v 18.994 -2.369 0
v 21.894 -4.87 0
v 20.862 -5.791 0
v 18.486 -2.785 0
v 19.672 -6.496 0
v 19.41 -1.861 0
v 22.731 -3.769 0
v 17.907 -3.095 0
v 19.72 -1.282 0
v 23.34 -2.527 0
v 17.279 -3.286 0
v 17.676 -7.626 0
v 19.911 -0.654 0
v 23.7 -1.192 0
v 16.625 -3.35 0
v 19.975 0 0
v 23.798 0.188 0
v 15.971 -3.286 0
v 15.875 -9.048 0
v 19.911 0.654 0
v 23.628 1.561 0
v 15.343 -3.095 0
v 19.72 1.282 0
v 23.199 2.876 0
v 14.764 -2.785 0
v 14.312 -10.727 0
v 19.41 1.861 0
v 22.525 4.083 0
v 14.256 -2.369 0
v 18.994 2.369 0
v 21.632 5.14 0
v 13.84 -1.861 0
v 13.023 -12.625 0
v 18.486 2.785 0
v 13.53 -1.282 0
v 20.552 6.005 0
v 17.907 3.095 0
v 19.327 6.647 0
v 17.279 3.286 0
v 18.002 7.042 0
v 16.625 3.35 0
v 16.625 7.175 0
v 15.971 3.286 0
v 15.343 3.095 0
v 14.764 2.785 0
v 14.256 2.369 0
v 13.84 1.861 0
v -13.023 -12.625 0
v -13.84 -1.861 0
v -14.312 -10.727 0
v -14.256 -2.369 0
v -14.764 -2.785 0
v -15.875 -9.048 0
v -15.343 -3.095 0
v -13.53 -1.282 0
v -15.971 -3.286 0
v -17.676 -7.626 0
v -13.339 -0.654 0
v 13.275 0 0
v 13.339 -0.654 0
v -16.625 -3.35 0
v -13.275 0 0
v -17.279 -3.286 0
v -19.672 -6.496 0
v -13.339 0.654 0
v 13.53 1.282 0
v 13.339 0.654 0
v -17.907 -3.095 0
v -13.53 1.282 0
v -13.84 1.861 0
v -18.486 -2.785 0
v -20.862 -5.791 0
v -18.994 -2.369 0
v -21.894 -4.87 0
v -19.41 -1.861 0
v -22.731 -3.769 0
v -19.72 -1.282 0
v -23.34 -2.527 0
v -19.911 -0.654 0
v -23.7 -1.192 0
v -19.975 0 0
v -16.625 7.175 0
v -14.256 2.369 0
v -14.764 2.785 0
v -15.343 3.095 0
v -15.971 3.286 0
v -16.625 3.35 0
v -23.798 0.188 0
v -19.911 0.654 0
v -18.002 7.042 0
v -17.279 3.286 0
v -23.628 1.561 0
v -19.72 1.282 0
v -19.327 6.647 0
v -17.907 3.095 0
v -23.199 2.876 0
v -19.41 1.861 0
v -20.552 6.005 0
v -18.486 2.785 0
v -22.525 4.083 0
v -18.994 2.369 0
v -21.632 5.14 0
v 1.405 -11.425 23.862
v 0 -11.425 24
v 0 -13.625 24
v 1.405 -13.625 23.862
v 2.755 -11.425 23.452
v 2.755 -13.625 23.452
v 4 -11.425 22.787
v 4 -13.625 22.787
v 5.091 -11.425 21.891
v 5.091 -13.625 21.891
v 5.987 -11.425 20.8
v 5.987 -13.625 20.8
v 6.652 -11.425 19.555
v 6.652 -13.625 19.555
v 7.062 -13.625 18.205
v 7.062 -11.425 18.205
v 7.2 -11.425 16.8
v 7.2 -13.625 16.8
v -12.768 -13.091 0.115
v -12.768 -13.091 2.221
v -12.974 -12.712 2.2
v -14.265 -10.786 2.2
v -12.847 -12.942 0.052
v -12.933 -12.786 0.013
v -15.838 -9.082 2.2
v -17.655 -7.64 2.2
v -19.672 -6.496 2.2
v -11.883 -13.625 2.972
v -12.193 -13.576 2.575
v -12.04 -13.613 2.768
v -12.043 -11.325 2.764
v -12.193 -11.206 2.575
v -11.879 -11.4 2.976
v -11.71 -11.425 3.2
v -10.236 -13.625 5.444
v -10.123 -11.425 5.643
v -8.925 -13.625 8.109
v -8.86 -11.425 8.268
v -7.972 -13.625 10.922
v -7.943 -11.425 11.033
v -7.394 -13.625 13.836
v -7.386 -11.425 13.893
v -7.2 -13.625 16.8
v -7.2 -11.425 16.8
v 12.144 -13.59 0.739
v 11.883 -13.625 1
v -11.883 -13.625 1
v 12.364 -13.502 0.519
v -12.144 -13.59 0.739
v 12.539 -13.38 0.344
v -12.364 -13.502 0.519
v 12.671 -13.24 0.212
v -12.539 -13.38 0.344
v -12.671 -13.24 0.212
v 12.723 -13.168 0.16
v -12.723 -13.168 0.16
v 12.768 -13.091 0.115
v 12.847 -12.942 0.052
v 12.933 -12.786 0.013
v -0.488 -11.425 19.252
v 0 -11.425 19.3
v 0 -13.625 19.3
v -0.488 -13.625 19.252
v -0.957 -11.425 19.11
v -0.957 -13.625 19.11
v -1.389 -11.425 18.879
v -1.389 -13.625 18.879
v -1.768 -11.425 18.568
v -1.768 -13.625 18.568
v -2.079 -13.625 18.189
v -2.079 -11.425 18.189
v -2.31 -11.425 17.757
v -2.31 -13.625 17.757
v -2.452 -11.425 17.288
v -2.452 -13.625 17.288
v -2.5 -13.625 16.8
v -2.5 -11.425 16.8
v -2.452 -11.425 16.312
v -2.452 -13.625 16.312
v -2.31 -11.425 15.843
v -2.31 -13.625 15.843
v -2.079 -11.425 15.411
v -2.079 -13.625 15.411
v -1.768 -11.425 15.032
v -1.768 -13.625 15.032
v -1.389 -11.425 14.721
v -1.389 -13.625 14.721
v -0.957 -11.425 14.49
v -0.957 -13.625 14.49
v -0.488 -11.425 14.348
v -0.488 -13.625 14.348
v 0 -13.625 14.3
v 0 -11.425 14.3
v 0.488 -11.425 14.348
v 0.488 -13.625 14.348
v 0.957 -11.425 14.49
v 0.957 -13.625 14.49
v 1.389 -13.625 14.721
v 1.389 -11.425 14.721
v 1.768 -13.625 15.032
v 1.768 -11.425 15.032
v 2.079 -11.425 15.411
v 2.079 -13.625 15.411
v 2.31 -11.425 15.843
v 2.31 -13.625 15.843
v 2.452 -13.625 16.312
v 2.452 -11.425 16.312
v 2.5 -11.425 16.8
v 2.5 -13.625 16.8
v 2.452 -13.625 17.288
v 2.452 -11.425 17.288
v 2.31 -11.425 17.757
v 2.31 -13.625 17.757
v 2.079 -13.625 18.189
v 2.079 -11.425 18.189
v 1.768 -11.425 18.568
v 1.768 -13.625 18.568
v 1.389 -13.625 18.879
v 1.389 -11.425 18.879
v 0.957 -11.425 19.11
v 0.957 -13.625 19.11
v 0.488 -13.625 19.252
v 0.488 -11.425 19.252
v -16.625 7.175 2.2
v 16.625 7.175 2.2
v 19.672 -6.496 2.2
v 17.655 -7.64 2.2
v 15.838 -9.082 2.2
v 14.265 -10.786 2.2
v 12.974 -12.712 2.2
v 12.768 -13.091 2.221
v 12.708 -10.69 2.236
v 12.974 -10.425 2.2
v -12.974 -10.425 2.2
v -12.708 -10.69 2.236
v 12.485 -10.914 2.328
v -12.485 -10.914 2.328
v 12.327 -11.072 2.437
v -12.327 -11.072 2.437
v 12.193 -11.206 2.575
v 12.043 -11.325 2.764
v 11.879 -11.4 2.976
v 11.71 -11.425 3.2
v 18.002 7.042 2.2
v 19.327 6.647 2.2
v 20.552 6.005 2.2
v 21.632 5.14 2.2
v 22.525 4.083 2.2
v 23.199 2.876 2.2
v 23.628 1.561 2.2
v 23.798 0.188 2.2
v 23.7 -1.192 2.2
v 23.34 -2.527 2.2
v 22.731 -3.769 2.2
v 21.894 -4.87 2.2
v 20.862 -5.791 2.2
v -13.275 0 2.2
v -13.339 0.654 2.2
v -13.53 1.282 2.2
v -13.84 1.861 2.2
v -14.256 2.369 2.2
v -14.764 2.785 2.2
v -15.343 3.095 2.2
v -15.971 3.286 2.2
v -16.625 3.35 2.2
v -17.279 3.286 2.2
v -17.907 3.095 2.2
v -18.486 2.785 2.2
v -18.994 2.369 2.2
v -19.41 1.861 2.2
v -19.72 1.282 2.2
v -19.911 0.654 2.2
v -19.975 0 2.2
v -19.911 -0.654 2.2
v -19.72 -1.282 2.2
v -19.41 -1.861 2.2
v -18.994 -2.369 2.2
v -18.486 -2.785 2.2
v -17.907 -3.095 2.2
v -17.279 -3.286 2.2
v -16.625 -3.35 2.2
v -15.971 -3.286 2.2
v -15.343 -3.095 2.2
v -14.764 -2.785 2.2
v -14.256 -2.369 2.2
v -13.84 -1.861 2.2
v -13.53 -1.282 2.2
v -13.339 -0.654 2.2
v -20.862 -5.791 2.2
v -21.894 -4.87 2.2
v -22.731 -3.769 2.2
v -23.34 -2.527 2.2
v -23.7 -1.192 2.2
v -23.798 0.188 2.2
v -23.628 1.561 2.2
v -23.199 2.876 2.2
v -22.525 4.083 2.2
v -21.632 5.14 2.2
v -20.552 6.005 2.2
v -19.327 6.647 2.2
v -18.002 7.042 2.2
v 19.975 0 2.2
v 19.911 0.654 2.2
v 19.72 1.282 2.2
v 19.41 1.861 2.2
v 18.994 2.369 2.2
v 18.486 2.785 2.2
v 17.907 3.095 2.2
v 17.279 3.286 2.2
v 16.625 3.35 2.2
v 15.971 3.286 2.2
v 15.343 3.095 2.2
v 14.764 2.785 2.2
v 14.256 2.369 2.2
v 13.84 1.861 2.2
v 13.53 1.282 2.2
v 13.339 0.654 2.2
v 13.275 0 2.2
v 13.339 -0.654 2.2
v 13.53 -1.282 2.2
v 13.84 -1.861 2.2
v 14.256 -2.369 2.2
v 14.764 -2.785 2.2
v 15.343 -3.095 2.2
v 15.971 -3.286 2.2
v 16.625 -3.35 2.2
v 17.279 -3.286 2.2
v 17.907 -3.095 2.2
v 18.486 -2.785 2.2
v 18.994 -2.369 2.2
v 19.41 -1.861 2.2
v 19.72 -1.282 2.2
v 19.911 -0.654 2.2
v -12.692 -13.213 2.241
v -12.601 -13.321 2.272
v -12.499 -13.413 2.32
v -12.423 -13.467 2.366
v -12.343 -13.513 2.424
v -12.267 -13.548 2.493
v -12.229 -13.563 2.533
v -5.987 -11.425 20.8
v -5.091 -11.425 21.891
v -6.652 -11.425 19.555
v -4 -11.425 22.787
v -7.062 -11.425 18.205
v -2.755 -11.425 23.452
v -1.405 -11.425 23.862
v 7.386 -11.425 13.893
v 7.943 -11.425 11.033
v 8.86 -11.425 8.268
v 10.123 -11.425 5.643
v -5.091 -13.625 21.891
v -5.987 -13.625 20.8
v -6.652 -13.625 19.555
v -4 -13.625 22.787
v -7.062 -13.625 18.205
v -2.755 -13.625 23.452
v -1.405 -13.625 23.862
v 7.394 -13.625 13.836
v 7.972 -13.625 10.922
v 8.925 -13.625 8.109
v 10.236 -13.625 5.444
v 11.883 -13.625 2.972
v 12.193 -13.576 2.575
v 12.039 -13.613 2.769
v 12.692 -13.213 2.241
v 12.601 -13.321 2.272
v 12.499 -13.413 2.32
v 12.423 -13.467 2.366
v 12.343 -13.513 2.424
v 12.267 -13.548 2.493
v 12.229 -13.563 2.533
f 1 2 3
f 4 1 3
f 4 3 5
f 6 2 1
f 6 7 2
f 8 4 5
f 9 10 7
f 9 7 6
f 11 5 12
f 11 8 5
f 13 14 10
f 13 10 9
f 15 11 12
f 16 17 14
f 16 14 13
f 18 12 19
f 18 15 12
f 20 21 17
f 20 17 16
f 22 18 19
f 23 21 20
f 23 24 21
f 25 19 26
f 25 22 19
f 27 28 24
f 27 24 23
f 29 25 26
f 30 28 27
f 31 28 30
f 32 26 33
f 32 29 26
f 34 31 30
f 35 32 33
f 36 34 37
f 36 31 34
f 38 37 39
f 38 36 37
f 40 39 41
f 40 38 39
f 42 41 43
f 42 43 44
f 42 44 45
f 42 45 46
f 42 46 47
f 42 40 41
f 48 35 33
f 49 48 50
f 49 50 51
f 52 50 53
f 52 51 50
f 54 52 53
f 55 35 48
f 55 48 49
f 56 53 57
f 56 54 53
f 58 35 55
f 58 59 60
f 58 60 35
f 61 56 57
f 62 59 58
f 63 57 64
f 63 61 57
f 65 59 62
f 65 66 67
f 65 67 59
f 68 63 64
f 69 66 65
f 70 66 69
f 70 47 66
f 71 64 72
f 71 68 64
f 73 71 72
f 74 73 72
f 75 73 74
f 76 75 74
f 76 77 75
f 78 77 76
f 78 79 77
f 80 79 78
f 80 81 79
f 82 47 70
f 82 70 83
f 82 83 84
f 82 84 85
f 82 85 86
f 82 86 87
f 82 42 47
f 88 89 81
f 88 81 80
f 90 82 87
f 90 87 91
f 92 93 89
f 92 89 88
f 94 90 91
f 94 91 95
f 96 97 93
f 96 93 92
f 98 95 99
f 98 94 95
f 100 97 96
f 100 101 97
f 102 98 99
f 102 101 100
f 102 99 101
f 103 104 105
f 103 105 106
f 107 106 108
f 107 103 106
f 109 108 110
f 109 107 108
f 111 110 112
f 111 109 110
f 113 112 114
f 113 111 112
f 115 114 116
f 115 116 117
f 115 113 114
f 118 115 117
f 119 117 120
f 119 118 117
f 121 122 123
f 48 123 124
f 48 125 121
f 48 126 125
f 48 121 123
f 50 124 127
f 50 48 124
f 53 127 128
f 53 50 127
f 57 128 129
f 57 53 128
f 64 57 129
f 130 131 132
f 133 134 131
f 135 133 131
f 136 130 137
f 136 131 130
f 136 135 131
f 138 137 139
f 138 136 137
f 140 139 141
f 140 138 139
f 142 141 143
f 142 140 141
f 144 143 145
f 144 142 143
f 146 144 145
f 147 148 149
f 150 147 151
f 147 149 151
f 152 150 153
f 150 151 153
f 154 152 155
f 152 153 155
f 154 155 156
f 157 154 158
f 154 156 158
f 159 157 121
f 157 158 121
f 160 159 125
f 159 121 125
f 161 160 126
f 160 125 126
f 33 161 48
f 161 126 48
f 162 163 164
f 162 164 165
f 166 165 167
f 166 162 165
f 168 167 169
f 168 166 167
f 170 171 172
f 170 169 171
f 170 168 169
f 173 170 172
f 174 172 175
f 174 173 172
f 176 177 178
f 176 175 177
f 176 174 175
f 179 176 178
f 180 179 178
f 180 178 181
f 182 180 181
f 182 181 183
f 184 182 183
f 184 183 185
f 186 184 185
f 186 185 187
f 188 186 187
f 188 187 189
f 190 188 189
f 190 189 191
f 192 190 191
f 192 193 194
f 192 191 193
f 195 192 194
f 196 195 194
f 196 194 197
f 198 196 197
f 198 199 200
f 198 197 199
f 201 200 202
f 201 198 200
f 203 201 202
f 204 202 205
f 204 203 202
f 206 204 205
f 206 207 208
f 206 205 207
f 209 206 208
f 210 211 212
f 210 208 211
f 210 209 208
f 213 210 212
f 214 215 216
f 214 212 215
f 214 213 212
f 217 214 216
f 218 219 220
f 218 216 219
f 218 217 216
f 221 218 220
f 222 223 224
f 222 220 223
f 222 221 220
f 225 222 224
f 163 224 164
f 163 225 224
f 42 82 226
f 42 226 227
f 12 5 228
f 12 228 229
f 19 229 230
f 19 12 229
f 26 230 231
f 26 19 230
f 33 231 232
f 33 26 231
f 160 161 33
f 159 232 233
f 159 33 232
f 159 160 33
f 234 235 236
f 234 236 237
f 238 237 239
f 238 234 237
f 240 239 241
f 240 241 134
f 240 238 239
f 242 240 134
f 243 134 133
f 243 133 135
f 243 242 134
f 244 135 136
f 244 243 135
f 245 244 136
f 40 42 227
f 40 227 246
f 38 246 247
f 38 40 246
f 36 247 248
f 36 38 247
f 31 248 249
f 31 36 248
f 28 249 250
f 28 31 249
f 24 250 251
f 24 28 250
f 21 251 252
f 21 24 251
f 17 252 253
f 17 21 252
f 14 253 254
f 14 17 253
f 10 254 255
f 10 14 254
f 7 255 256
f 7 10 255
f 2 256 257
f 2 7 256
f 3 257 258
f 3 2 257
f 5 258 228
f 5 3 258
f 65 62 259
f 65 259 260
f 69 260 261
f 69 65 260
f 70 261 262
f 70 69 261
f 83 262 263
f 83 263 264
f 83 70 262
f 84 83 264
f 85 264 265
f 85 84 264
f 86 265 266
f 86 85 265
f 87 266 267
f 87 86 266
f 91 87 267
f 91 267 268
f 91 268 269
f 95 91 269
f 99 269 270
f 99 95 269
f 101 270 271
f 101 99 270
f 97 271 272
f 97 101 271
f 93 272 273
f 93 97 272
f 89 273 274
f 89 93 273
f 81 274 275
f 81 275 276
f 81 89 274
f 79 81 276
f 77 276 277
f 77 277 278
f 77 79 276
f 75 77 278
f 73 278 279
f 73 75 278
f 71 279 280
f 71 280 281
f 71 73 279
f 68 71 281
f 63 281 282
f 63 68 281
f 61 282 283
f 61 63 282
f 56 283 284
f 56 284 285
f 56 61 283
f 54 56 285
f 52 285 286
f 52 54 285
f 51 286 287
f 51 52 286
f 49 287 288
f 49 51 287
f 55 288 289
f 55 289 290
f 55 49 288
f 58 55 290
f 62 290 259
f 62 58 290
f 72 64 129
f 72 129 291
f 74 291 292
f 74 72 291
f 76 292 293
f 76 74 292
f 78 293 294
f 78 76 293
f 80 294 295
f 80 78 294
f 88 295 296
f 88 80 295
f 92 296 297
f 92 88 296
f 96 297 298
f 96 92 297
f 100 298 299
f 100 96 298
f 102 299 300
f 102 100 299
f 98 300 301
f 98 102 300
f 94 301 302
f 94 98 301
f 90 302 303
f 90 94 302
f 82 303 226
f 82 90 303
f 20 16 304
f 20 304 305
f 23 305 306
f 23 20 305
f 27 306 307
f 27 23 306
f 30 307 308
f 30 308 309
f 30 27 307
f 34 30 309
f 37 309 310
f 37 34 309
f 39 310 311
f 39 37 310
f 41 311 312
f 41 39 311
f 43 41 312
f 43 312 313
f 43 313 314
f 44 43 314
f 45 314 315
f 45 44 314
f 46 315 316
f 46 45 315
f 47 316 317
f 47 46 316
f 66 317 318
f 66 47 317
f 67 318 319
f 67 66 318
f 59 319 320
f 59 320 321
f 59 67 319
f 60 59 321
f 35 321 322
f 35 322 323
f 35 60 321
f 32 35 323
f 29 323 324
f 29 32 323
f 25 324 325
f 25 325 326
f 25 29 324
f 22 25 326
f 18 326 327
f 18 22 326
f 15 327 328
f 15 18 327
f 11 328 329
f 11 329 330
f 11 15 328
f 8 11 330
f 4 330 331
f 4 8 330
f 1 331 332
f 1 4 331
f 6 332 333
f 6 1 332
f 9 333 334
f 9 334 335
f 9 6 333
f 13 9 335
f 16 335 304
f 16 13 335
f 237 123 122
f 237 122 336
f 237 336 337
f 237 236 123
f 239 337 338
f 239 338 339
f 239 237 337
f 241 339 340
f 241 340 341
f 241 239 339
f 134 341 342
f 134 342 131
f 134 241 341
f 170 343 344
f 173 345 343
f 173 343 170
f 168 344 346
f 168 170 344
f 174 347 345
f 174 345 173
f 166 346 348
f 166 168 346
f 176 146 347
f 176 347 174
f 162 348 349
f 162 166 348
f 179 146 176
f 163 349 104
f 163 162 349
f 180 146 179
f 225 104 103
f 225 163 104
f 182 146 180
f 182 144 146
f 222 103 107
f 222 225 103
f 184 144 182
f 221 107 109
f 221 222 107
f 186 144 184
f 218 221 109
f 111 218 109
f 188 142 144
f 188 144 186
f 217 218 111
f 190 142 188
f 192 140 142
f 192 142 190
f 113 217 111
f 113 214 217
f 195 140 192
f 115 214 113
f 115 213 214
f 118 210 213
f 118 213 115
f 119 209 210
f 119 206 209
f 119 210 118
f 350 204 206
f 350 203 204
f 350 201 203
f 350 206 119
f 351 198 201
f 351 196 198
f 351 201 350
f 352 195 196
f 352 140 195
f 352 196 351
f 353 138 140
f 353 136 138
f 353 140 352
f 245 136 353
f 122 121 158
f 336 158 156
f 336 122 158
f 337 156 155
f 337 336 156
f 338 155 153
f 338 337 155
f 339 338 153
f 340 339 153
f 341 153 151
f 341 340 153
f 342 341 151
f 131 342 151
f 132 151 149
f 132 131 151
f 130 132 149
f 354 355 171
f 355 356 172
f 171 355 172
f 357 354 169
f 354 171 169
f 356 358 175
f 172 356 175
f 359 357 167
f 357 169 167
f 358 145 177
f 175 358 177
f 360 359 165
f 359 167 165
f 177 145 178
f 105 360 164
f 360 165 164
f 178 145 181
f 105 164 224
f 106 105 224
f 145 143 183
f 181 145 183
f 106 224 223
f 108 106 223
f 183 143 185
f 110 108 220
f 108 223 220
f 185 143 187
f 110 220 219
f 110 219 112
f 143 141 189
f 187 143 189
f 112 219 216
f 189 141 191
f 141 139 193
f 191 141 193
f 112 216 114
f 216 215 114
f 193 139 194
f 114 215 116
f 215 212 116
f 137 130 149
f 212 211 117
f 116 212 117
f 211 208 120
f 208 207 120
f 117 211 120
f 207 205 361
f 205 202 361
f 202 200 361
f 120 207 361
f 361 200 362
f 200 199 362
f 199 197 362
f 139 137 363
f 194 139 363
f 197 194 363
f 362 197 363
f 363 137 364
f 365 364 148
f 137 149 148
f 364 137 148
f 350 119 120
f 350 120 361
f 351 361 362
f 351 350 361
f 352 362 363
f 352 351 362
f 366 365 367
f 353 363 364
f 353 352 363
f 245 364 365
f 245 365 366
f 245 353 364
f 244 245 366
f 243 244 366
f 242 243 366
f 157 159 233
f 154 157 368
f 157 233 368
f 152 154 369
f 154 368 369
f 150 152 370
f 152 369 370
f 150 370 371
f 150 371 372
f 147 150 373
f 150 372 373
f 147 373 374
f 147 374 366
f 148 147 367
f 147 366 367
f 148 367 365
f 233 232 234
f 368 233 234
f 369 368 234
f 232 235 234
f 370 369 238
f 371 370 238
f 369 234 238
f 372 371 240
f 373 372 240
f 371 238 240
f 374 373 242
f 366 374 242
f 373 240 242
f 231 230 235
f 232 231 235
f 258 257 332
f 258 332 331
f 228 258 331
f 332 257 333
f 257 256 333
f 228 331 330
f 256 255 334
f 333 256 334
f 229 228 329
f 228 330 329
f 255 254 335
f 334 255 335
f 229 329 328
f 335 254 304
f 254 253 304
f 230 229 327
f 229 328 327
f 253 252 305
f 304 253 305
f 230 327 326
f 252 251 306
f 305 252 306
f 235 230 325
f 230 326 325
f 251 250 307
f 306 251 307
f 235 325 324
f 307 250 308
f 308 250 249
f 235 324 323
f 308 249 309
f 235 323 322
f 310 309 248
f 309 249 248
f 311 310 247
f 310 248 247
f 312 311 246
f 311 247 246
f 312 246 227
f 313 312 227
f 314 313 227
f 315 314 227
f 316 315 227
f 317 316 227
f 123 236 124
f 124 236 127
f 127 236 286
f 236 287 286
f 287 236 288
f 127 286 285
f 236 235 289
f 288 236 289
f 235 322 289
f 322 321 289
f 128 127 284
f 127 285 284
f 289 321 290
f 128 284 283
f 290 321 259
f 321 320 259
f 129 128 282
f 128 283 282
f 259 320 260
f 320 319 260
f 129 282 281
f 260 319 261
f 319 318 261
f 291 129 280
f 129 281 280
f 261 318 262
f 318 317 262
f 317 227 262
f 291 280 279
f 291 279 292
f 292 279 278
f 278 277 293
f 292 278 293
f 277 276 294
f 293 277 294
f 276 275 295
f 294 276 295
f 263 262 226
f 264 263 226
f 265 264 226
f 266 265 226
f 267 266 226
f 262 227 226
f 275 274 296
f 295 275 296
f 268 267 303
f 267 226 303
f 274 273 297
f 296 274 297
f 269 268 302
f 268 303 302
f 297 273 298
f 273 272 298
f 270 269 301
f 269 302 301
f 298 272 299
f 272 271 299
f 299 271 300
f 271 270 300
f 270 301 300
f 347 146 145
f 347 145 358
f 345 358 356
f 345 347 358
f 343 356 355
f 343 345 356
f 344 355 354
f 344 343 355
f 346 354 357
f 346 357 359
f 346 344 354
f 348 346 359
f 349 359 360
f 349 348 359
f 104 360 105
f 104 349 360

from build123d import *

# Parameters (mm, degrees)
ESBO_O1_R                  = 3.35
RESSALTO_EXTRUS_O1_DEPTH   = 2.2
ESBO_O2_W                  = 25
ESBO_O2_H                  = 2.2
RESSALTO_EXTRUS_O2_DEPTH   = 21.8
CORTE_EXTRUS_O2_DEPTH      = 40.687277558
CORTE_EXTRUS_O2_DEPTH_BACK = 24
ESBO_O3_R                  = 2.5
FILETE1_R                  = 1


with BuildPart() as part:
    # Esboço1 → Ressalto-extrusão1 (new body)
    with BuildSketch(Plane.XY):
        with BuildLine():
            ThreePointArc((19.671946284, -6.495902042), (15.467093732, -9.437851933), (12.5, -13.625))
            Line((12.5, -13.625), (-12.5, -13.625))
            ThreePointArc((-12.5, -13.625), (-15.467093732, -9.437851933), (-19.671946284, -6.495902042))
            ThreePointArc((-19.671946284, -6.495902042), (-23.628167932, 1.560853588), (-16.625, 7.175))
            Line((-16.625, 7.175), (16.625, 7.175))
            ThreePointArc((16.625, 7.175), (23.628167932, 1.560853588), (19.671946284, -6.495902042))
        make_face()
        with Locations((16.625, 0)):
            Circle(ESBO_O1_R, mode=Mode.SUBTRACT)
        with Locations((-16.625, 0)):
            Circle(ESBO_O1_R, mode=Mode.SUBTRACT)
    extrude(amount=RESSALTO_EXTRUS_O1_DEPTH)

    # Esboço2 → Ressalto-extrusão2 (add)
    with BuildSketch(Plane.XY.offset(2.2)):
        with Locations((0, -12.525)):
            Rectangle(ESBO_O2_W, ESBO_O2_H)
    extrude(amount=RESSALTO_EXTRUS_O2_DEPTH)

    # Esboço3 → Corte-extrusão2 (cut, two sides: drawn at the far end of the back side and taken through both)
    with BuildSketch(Plane.XZ.offset(13.625).offset(-CORTE_EXTRUS_O2_DEPTH_BACK)):
        with Locations(Location((0, 16.8, 0), (0, 0, 90))):
            Circle(ESBO_O3_R)
        with BuildLine():
            ThreePointArc((-12.5, 2.2), (-8.565992578, 9.033887716), (-7.2, 16.8))
            ThreePointArc((-7.2, 16.8), (-5.091168815, 21.891168834), (2.7e-08, 24))
            Line((2.7e-08, 24), (-12.5, 24))
            Line((-12.5, 24), (-12.5, 2.2))
        make_face()
        with BuildLine():
            Line((12.5, 24), (2.7e-08, 24))
            ThreePointArc((2.7e-08, 24), (5.091168834, 21.891168815), (7.2, 16.8))
            ThreePointArc((7.2, 16.8), (8.565992578, 9.033887716), (12.5, 2.2))
            Line((12.5, 2.2), (12.5, 24))
        make_face()
    extrude(amount=CORTE_EXTRUS_O2_DEPTH + CORTE_EXTRUS_O2_DEPTH_BACK, mode=Mode.SUBTRACT)

    # Filete1
    filete1_edges = [part.edges().sort_by_distance(p)[0] for p in [
        (12.5, -12.525, 2.2),
        (-12.5, -12.525, 2.2),
        (0, -11.425, 2.2),
    ]]
    fillet(filete1_edges, radius=FILETE1_R)
    filete1_2_edges = [part.edges().sort_by_distance(p)[0] for p in [
        (0, -13.625, 0),
        (12.5, -13.625, 1.159674218),
        (-12.5, -13.625, 1.159674218),
    ]]
    fillet(filete1_2_edges, radius=FILETE1_R)


solid = part.part
